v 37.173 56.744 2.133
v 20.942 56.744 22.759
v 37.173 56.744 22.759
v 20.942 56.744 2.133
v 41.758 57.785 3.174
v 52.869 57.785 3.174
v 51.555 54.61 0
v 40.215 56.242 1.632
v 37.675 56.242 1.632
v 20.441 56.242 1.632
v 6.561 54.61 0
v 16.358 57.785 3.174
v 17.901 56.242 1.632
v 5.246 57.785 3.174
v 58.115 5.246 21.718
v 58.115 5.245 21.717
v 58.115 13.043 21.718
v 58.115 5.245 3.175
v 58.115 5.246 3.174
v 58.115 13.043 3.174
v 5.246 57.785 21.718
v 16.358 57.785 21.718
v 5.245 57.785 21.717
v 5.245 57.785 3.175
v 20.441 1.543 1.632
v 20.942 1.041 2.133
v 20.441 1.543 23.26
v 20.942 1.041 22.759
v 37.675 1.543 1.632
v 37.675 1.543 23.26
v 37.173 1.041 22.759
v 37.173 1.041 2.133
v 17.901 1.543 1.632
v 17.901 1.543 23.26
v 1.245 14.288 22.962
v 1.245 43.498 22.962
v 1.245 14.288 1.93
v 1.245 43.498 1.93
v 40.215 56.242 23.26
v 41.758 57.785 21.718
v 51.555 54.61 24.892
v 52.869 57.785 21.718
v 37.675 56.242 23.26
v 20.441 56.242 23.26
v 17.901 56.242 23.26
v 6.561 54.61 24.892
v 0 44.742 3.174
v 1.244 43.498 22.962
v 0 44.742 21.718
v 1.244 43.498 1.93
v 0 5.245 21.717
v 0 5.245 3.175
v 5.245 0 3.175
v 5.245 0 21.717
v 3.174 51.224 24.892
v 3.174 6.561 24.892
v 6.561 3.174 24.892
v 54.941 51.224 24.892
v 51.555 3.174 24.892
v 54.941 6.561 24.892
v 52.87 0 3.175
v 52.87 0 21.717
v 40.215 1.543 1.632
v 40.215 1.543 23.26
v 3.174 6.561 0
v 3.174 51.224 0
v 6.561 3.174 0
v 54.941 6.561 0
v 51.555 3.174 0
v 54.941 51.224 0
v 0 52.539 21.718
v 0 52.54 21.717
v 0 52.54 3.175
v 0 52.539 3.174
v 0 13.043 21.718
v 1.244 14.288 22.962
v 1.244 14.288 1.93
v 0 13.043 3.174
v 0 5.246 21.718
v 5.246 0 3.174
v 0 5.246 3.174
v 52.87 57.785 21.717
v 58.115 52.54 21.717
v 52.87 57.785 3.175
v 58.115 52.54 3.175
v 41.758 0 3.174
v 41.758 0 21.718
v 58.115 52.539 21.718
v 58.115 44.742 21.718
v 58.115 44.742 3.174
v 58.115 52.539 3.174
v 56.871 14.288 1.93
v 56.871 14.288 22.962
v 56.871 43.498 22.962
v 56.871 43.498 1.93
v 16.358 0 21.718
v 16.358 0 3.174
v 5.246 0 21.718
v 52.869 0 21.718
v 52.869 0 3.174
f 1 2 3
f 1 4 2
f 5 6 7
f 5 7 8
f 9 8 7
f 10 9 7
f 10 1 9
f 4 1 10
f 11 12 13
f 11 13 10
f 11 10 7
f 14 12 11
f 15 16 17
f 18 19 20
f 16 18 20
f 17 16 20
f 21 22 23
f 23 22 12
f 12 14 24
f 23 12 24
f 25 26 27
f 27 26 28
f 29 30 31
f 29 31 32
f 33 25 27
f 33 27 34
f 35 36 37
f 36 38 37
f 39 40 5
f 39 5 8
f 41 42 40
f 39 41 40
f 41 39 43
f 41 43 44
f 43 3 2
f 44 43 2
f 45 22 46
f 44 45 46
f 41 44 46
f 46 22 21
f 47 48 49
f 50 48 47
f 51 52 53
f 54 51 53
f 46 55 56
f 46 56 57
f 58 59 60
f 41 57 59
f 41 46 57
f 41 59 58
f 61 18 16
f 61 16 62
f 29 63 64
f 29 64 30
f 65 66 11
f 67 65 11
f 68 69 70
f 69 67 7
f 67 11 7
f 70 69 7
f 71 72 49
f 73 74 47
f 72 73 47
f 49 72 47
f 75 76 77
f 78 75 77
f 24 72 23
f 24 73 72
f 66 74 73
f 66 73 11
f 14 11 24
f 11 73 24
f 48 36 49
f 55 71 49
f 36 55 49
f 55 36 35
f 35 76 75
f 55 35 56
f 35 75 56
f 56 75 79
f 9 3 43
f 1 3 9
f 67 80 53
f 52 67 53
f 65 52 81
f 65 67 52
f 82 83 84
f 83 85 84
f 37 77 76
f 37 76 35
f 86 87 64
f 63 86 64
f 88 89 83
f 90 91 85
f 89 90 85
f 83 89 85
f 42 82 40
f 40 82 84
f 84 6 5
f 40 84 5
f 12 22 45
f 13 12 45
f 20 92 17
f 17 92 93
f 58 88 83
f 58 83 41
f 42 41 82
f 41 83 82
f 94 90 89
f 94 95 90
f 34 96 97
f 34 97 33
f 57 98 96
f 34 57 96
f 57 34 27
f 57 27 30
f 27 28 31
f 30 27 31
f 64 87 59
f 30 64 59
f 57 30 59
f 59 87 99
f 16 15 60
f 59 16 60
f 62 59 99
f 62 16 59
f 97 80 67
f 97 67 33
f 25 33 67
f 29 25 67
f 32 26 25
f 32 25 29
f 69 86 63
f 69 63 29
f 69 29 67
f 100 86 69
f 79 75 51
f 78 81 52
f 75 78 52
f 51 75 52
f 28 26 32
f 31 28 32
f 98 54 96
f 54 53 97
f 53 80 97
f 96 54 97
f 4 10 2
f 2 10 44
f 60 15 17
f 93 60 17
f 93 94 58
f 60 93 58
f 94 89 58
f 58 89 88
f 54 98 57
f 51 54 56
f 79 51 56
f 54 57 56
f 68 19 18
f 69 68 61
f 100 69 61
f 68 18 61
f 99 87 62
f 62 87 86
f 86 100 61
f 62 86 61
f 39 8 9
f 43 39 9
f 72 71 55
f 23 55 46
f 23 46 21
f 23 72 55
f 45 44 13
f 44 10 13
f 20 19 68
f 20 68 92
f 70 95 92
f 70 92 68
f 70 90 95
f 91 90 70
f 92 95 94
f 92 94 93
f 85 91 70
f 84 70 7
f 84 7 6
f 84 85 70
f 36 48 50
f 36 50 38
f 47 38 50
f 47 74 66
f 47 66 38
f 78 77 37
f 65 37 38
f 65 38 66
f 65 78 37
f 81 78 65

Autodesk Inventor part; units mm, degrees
ref_plane "YZ Plane" through (0, 0, 0) normal (1, 0, 0) x (0, 1, 0)
ref_plane "XZ Plane" through (0, 0, 0) normal (0, 1, 0) x (-1, 0, 0)
ref_plane "XY Plane" through (0, 0, 0) normal (0, 0, 1) x (1, 0, 0)
sketch "Sketch1" plane through (0, 0, 0) normal (0, 0, 1) x (1, 0, 0)
  line L0 (0, 0) -> (58.1152, 0)
  line L1 (58.1152, 0) -> (58.1152, 57.785)
  line L2 (58.1152, 57.785) -> (0, 57.785)
  line L3 (0, 57.785) -> (0, 0)
  line L4 (0, 43.4975) -> (58.1152, 43.4975)
  line L5 (0, 28.8925) -> (58.1152, 28.8925)
  line L6 (0, 14.2875) -> (58.1152, 14.2875)
  line L7 (29.0576, 57.785) -> (29.0576, 0)
  line L8 (16.3576, 57.785) -> (16.3576, 0)
  line L9 (41.7576, 57.785) -> (41.7576, 0)
  line L10 (1.2446, 43.4975) -> (1.2446, 14.2875)
  line L11 (56.8706, 43.4975) -> (56.8706, 14.2875)
  line L12 (16.3576, 56.7436) -> (41.7576, 56.7436)
  line L13 (16.3576, 1.0414) -> (41.7576, 1.0414)
  line L14 (4.9602, 57.785) -> (10.8826, 57.785) construction
  line L15 (0, 52.54) -> (5.245, 57.785)
  line L16 (58.1152, 52.54) -> (52.8702, 57.785)
  line L17 (0, 5.245) -> (5.245, 0)
  line L18 (58.1152, 5.245) -> (52.8702, 0)
  line L19 (41.7576, 56.242) -> (16.3576, 56.242)
  line L20 (41.7576, 1.543) -> (16.3576, 1.543)
  line L21 (41.7576, 57.785) -> (40.2146, 56.242)
  line L22 (16.3576, 57.785) -> (17.9006, 56.242)
  line L23 (41.7576, 0) -> (40.2146, 1.543)
  line L24 (16.3576, 0) -> (17.9006, 1.543)
  line L25 (37.6746, 57.785) -> (37.6746, 56.242)
  line L26 (20.4406, 57.785) -> (20.4406, 56.242)
  line L27 (37.6746, 0) -> (37.6746, 1.543)
  line L28 (20.4406, 0) -> (20.4406, 1.543)
  point P0 (52.8702, 0)
  point P1 (17.399, 1.0414)
  point P2 (40.7162, 1.0414)
  point P3 (17.399, 56.7436)
  point P4 (40.7162, 56.7436)
  point P5 (20.4406, 56.7436)
  point P6 (37.6746, 56.7436)
  point P7 (20.4406, 1.0414)
  point P8 (37.6746, 1.0414)
  dimension "d0" = 58.1152
  dimension "d1" = 57.785
  dimension "d2" = 29.21
  dimension "d3" = 25.4
  dimension "d4" = 55.626
  dimension "d5" = 55.7022
  dimension "d18" = 74.5363
  dimension "d19" = 45
  dimension "d34" = 54.6989
  dimension "d35" = 45
  dimension "d36" = 2.54
extrude "Extrusion1" add sketch "Sketch1" along normal blind 24.892
extrude "Extrusion2" cut sketch "Sketch1" along normal through all contours L24 L13 L28 L0 | L3 L5 L10 L6 | L28 L13 L7 L0 | L24 L20 L28 L13 | L3 L4 L10 L5 | L7 L13 L27 L0 | L27 L13 L23 L0 | L27 L20 L23 L13 | L2 L26 L12 L22 | L11 L5 L1 L6 | L2 L7 L12 L26 | L12 L26 L19 L22 | L11 L4 L1 L5 | L2 L25 L12 L7 | L25 L12 L21 L19 | L2 L21 L12 L25
extrude "Extrusion3" cut sketch "Sketch1" along normal through all contours L3 L17 L0 | L3 L2 L15 | L18 L1 L0 | L16 L2 L1
chamfer "Chamfer5" distance 3.175 angle 45 8 edges at (2.6225, 55.1625, 24.892) (55.4927, 55.1625, 24.892) (55.4927, 2.6225, 24.892) (2.6225, 2.6225, 24.892) (2.6225, 2.6225, 0) (2.6225, 55.1625, 0) (55.4927, 55.1625, 0) (55.4927, 2.6225, 0)
chamfer "Chamfer6" distance 3.175 angle 45 8 edges at (0, 45.7737, 0) (13.0464, 57.785, 0) (45.0688, 0, 0) (58.1152, 12.0113, 0) (0, 45.7737, 24.892) (13.0464, 57.785, 24.892) (58.1152, 12.0113, 24.892) (45.0688, 0, 24.892)
chamfer "Chamfer7" distance 0.5017 angle 45 4 edges at (37.6746, 56.7436, 12.446) (20.4406, 56.7436, 12.446) (37.6746, 1.0414, 12.446) (20.4406, 1.0414, 12.446)
chamfer "Chamfer8" distance 1.2446 angle 45 4 edges at (58.1152, 43.4975, 12.446) (58.1152, 14.2875, 12.446) (0, 43.4975, 12.446) (0, 14.2875, 12.446)
properties part number "Inclinometer" material "ABS Plastic"
